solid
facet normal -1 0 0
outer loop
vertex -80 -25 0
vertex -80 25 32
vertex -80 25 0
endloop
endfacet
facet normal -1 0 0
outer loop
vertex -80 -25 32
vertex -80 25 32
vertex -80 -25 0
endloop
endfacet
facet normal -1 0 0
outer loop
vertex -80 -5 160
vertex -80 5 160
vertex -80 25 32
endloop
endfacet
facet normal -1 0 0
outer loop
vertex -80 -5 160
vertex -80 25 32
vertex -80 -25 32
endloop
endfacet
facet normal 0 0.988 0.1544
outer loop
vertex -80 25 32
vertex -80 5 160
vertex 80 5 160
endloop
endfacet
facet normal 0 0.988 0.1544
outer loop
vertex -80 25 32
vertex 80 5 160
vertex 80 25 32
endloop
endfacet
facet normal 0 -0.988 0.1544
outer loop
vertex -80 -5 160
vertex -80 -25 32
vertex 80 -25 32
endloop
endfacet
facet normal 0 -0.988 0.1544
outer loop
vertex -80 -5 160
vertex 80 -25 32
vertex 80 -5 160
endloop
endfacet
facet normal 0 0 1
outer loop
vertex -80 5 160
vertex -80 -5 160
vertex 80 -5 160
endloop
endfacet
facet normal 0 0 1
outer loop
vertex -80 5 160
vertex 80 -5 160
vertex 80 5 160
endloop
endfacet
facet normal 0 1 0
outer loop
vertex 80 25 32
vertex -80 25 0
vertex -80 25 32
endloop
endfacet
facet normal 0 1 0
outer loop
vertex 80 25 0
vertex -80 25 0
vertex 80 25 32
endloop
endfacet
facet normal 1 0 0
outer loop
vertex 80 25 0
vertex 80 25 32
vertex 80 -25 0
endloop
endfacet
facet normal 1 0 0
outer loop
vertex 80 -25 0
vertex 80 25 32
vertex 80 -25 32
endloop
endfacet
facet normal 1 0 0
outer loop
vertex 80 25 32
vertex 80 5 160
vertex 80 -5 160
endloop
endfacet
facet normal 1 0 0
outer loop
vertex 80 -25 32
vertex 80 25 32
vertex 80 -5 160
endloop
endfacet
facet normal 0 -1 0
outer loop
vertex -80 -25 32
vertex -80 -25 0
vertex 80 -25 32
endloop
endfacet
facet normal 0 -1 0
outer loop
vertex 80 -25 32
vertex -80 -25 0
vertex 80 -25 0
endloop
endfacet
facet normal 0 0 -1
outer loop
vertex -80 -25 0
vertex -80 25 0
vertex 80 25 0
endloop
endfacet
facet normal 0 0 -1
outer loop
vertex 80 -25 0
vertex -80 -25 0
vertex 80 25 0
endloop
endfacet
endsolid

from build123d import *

# Parameters (mm, degrees)
F0_W     = 160
F0_H     = 50
F1_DEPTH = 32
F3_DEPTH = 160


with BuildPart() as f1:
    # F0 (on Top) → F1 (new body)
    with BuildSketch(Plane.XY):
        Rectangle(F0_W, F0_H)
    extrude(amount=F1_DEPTH)

    # F2 (on face) → F3 (join)
    with BuildSketch(Plane(origin=(-80, 0, 0), x_dir=(0, -1, 0), z_dir=(-1, 0, 0))):
        Polygon((5, 160), (-5, 160), (-25, 32), (25, 32), align=None)
    extrude(amount=-F3_DEPTH)


solid = f1.part
